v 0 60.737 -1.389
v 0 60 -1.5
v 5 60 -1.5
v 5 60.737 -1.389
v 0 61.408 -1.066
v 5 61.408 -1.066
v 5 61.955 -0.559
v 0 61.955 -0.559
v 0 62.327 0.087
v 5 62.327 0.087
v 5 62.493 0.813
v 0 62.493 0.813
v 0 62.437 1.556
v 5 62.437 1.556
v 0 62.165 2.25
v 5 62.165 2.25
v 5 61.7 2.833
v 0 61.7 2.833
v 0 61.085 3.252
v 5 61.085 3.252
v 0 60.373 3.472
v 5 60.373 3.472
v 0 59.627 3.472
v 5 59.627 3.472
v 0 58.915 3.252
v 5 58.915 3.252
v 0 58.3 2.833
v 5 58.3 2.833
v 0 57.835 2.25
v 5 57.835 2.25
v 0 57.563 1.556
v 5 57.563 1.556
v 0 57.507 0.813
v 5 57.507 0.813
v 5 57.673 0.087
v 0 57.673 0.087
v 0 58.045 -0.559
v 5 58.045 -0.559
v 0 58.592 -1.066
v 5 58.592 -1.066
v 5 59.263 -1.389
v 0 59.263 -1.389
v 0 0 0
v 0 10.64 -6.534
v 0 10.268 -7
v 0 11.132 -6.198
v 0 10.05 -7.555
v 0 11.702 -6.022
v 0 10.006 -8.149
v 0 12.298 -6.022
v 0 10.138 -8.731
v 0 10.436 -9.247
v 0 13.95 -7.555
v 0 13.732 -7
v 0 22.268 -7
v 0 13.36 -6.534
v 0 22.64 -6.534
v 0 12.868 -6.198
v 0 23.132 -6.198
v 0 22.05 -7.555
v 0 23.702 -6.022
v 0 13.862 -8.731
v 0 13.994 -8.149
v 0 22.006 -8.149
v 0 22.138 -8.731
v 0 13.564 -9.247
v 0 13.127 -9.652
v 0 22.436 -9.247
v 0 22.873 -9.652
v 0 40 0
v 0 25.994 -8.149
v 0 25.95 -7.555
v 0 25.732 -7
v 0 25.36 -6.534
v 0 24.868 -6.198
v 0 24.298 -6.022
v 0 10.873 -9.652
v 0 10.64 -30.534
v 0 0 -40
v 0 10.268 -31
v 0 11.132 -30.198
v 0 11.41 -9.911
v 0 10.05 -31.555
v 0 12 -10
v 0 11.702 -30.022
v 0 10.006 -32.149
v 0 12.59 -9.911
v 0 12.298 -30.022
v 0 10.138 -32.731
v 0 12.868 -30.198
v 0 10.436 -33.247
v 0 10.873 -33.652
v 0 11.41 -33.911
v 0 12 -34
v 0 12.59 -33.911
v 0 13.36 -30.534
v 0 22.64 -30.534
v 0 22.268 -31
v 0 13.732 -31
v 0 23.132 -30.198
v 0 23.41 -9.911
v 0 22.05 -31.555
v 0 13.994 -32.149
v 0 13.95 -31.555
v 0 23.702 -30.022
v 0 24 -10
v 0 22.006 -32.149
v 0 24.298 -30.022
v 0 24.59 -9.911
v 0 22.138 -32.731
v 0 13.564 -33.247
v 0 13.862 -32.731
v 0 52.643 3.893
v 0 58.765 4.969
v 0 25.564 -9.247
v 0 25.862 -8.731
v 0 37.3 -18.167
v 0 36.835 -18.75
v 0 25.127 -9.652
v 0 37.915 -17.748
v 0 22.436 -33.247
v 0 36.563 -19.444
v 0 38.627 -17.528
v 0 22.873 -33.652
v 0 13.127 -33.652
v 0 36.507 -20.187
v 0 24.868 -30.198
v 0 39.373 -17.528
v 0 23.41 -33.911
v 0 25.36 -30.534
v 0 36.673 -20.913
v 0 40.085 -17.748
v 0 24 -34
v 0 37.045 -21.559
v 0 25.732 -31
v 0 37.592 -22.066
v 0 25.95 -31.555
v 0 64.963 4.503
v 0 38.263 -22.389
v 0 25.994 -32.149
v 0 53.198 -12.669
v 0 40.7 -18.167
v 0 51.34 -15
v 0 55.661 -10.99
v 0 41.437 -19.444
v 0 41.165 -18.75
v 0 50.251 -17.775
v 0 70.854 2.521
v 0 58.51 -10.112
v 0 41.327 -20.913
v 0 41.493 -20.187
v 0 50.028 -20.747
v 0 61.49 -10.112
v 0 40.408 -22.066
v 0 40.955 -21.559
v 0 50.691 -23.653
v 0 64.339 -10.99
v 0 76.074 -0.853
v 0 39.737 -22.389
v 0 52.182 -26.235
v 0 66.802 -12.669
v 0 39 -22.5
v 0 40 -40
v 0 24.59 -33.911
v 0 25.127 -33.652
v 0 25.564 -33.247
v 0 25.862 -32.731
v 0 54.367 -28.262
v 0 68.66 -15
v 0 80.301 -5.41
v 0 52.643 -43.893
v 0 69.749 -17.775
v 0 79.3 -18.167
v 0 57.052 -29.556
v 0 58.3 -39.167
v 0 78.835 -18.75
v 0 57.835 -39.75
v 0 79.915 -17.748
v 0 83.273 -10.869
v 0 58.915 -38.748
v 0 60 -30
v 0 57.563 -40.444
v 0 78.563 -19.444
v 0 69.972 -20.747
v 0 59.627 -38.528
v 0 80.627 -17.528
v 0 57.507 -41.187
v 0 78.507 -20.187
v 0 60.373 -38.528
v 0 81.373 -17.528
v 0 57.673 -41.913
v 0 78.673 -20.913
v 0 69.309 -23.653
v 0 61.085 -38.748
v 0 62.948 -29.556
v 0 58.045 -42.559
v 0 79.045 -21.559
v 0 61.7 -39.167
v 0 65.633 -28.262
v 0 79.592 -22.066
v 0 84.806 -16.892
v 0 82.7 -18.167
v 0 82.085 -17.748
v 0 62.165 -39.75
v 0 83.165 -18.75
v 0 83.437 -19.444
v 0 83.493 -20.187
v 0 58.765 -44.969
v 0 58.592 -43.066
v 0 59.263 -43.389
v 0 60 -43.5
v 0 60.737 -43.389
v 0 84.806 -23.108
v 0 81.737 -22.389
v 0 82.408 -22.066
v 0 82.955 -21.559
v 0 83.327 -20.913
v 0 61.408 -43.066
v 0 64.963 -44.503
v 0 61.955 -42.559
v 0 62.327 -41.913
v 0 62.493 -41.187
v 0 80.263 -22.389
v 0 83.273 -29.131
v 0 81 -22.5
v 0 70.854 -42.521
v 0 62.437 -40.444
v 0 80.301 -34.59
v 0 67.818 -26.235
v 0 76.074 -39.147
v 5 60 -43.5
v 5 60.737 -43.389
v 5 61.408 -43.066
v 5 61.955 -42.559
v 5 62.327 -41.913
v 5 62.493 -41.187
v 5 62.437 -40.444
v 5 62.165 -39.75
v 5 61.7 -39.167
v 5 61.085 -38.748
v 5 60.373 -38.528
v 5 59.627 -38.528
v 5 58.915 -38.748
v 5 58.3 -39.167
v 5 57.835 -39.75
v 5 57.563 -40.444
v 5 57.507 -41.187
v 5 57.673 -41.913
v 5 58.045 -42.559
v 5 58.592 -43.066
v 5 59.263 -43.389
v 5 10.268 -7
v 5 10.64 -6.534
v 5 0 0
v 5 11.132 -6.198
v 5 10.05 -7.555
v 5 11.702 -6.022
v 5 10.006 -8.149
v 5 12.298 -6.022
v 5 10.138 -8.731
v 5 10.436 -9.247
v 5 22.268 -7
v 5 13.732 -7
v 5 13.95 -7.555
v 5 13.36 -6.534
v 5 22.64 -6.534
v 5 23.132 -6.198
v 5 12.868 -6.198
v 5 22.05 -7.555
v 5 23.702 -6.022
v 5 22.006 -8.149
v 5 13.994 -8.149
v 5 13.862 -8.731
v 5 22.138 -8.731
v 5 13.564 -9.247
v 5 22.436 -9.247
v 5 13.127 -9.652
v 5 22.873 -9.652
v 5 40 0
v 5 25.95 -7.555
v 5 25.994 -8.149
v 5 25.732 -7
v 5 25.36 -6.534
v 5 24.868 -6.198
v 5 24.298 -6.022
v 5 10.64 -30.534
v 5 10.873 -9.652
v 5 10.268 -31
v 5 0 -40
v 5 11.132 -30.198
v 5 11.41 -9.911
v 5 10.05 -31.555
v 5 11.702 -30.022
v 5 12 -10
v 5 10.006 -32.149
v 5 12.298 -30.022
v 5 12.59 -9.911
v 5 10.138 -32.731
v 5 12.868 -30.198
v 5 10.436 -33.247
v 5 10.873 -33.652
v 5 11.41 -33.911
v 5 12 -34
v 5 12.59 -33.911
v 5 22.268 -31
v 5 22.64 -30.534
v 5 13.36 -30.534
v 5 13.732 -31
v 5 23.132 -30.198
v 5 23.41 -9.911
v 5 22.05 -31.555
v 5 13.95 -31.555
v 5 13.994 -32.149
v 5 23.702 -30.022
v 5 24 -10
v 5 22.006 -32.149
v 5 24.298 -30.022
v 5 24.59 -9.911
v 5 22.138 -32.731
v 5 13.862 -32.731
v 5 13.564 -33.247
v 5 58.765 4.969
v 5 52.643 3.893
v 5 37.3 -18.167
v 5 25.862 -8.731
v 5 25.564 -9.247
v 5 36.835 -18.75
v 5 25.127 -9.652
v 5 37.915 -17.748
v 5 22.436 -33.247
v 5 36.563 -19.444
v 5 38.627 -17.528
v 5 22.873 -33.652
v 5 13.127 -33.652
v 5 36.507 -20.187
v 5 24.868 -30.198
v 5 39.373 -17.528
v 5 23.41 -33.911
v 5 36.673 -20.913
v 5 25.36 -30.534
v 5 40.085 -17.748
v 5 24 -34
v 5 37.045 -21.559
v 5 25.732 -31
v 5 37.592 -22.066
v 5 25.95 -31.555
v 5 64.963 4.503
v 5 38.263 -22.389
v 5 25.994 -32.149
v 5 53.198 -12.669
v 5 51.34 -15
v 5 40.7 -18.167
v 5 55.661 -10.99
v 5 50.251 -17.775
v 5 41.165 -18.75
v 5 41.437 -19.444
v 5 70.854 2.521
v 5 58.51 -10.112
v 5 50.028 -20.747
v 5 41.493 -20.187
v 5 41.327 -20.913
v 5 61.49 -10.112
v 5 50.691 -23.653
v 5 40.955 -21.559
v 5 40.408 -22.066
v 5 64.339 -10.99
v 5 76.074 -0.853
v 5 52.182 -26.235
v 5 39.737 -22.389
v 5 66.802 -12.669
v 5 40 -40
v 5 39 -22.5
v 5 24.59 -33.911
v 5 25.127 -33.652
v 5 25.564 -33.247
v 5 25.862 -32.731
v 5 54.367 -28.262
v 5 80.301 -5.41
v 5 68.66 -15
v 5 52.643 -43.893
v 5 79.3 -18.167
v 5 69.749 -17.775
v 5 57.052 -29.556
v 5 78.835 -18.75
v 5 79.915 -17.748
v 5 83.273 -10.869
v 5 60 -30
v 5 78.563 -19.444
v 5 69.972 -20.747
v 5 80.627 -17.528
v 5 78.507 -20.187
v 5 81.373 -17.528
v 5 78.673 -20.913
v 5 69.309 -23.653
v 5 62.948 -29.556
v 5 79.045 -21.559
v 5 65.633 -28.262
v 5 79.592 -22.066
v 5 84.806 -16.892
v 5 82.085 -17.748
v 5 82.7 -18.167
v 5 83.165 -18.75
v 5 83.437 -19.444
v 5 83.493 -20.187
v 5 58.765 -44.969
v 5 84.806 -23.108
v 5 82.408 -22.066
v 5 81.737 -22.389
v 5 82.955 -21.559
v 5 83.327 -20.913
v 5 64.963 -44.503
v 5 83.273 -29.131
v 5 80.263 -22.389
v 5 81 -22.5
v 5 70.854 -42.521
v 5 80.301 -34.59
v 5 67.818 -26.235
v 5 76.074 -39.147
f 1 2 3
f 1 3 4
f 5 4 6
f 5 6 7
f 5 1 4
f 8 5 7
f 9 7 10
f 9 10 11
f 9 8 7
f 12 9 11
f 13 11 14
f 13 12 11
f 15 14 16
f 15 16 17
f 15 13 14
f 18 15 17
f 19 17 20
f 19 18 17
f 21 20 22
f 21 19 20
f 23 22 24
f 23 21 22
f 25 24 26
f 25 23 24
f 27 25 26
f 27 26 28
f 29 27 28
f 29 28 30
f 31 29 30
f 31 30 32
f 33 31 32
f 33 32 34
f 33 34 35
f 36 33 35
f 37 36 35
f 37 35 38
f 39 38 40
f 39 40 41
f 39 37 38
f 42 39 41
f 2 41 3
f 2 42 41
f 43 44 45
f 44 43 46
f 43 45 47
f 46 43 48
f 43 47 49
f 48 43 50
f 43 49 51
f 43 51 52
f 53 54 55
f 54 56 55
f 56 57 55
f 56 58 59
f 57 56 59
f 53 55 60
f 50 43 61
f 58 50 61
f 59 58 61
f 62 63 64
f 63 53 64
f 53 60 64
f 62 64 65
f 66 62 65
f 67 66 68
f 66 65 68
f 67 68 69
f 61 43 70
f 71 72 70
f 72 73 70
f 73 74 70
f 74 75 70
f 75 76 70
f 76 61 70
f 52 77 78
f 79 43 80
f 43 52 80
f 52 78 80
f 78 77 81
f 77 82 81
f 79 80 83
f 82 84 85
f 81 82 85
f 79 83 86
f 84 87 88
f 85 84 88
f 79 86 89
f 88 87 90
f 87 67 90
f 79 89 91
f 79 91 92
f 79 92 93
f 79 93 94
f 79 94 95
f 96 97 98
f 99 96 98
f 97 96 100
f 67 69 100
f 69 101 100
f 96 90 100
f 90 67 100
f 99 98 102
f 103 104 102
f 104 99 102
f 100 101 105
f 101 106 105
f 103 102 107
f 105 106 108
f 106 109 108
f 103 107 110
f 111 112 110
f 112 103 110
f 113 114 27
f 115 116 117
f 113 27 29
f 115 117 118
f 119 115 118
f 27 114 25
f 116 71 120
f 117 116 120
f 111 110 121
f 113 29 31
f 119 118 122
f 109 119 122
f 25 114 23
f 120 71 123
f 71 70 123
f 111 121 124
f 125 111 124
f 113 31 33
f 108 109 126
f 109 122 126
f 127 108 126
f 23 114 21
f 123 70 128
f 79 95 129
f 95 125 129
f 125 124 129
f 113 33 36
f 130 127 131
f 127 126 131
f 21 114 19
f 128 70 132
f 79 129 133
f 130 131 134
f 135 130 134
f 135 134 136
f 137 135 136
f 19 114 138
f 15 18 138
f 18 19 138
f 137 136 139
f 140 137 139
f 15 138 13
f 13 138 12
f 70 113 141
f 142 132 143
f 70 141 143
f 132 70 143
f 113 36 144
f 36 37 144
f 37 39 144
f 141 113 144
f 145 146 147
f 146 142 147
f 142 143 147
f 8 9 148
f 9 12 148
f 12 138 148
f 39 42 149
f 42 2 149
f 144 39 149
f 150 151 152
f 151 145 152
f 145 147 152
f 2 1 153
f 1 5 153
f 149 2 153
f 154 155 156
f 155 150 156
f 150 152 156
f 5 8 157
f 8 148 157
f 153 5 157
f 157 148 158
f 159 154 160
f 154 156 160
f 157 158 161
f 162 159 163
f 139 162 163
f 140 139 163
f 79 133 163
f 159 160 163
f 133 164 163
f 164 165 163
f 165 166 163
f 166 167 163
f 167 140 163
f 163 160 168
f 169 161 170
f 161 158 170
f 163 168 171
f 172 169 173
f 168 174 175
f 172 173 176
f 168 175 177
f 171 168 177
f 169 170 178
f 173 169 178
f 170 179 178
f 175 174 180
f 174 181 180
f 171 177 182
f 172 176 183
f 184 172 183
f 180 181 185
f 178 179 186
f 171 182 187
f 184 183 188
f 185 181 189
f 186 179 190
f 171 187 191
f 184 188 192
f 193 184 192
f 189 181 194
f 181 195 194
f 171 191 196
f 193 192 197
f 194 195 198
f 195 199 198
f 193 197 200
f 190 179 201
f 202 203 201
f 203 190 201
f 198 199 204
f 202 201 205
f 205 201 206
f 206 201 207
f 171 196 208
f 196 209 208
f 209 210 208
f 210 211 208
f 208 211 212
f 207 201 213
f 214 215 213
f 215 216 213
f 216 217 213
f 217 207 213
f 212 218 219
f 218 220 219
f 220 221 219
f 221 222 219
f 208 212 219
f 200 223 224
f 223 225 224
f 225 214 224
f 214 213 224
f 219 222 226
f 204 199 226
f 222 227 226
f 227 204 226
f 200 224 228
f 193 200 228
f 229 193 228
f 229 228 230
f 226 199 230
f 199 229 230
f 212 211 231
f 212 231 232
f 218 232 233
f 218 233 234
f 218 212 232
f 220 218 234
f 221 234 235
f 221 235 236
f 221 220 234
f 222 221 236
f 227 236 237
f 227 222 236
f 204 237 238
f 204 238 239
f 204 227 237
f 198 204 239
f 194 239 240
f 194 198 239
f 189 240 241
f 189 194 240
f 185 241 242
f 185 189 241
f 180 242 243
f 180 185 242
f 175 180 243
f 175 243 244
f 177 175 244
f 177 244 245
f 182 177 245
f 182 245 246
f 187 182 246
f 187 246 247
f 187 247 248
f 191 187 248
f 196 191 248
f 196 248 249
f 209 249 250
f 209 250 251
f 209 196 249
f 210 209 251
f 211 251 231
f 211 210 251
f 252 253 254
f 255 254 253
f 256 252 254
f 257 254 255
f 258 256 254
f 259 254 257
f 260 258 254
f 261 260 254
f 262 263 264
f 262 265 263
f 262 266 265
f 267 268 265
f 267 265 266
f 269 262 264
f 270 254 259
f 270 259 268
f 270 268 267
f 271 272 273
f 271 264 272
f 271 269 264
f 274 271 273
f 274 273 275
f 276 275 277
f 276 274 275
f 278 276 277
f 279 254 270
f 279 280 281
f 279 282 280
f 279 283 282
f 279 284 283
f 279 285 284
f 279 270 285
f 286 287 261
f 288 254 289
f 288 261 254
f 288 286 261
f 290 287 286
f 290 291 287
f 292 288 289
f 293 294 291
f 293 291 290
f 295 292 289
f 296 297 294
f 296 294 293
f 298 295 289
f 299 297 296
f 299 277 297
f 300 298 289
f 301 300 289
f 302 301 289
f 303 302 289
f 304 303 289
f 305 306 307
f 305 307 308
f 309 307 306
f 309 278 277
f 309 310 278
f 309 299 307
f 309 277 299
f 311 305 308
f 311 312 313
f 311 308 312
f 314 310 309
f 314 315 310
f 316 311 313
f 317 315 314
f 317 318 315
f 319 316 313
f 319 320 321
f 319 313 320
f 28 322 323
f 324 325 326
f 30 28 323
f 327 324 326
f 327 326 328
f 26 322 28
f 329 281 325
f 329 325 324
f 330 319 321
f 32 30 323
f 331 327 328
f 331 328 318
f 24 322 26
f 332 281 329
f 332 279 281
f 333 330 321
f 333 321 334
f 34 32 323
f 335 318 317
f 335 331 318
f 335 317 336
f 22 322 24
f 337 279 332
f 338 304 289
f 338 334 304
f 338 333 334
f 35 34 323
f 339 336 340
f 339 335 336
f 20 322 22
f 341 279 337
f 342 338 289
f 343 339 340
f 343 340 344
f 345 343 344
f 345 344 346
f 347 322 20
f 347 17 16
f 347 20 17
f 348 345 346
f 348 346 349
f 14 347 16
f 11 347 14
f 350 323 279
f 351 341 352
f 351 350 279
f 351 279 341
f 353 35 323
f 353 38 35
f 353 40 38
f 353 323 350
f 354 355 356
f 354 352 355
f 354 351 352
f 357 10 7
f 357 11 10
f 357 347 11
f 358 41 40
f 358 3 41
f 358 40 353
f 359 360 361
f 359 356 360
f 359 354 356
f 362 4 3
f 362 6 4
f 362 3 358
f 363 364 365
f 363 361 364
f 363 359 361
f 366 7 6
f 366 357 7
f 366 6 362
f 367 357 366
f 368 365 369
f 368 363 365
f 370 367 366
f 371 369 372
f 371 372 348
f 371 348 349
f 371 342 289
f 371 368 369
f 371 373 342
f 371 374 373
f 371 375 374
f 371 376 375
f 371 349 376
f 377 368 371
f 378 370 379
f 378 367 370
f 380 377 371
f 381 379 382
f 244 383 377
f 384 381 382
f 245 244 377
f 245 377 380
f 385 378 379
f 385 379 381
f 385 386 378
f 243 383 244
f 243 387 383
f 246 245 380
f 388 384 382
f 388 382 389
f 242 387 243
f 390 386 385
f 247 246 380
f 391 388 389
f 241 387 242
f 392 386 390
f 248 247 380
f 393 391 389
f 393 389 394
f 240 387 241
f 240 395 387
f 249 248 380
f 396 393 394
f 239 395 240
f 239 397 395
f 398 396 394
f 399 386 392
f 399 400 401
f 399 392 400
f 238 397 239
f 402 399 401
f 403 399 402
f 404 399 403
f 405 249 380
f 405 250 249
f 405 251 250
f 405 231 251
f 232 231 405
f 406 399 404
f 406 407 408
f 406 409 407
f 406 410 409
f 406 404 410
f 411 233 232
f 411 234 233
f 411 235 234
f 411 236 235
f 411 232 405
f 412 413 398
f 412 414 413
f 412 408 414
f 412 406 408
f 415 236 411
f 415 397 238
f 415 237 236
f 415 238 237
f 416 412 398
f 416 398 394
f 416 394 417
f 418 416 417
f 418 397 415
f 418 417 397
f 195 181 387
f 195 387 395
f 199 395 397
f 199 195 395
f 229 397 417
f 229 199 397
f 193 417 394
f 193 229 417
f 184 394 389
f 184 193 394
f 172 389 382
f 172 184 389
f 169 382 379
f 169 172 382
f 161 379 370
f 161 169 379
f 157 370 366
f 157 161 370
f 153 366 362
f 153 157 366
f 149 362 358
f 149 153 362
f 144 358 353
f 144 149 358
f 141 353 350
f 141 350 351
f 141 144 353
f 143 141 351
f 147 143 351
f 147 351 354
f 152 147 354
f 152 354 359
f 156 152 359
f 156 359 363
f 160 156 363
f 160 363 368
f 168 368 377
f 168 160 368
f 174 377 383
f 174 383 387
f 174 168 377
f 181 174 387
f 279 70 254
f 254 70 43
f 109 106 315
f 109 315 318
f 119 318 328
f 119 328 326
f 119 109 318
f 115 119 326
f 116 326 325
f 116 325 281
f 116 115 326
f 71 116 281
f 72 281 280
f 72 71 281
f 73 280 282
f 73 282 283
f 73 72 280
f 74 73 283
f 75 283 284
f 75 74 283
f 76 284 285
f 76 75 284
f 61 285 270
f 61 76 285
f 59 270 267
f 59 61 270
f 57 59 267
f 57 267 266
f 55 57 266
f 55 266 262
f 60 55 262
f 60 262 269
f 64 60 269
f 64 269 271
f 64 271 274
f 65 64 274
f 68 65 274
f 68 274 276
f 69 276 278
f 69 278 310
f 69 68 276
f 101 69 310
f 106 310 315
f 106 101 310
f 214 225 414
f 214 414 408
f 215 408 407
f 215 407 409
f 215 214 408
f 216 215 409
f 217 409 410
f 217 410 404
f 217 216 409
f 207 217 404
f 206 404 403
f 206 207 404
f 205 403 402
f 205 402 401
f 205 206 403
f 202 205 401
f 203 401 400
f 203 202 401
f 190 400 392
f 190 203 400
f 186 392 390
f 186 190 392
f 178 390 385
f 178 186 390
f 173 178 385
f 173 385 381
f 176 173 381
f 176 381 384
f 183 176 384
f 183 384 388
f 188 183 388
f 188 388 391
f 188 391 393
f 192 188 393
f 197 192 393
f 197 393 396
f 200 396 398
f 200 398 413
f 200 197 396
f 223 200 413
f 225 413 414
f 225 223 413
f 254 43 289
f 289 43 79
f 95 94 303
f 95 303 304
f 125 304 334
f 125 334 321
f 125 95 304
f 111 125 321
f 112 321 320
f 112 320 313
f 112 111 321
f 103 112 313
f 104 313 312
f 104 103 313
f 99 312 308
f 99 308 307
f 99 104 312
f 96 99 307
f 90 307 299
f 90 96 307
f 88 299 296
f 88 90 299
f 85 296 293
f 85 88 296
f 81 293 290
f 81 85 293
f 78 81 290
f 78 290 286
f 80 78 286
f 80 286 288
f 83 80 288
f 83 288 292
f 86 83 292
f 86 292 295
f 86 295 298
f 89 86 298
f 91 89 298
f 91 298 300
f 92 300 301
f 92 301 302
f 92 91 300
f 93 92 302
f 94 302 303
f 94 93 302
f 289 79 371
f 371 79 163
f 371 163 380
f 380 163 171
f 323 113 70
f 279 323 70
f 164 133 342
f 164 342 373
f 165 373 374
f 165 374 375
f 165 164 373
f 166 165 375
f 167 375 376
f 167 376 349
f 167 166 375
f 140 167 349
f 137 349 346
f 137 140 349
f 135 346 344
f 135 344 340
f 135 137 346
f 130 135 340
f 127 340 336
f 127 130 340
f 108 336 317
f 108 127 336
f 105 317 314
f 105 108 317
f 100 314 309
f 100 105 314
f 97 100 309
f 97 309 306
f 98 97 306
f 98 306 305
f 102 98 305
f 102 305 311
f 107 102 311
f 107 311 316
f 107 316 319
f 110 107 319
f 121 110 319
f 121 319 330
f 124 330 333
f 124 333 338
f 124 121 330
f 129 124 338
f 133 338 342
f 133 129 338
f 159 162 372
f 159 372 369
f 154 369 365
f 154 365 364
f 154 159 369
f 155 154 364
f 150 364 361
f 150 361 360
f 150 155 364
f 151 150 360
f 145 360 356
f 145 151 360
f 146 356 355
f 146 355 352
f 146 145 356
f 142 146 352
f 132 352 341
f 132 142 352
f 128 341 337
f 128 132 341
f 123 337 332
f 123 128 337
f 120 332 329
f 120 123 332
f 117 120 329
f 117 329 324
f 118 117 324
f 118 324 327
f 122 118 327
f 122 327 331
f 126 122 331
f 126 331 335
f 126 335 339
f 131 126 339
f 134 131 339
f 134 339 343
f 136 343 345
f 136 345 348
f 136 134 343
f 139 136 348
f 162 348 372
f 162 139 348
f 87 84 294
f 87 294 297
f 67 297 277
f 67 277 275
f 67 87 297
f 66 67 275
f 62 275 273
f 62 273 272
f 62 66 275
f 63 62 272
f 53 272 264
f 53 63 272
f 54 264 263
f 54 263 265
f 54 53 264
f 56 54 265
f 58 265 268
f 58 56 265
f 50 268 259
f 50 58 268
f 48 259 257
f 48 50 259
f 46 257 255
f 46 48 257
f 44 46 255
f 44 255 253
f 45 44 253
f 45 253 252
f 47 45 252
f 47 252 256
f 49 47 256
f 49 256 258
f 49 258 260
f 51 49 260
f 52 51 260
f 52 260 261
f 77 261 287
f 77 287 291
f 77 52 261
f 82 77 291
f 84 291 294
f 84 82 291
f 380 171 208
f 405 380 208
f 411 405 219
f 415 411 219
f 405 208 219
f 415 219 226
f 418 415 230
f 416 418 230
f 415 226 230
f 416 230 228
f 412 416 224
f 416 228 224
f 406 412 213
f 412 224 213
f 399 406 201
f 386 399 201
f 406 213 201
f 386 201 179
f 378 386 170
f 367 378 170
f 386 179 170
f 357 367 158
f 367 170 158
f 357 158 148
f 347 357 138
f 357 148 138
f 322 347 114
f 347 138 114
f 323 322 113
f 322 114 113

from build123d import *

# Parameters (mm, degrees)
CROQUIS1_R              = 2
CROQUIS1_R_2            = 2.5
CROQUIS1_R_3            = 10
SALIENTE_EXTRUIR1_DEPTH = 5


with BuildPart() as part:
    # Croquis1 → Saliente-Extruir1 (new body)
    with BuildSketch(Plane(origin=(0, 0, 0), x_dir=(0, 0, -1), z_dir=(1, 0, 0))):
        with BuildLine():
            ThreePointArc((43.892972847, 52.642972847), (20, 85), (-3.892972847, 52.642972847))
            Line((-3.892972847, 52.642972847), (0, 40))
            Line((0, 40), (0, 0))
            Line((0, 0), (40, 0))
            Line((40, 0), (40, 40))
            Line((40, 40), (43.892972847, 52.642972847))
        make_face()
        with Locations((8, 12)):
            Circle(CROQUIS1_R, mode=Mode.SUBTRACT)
        with Locations((8, 24)):
            Circle(CROQUIS1_R, mode=Mode.SUBTRACT)
        with Locations((20, 39)):
            Circle(CROQUIS1_R_2, mode=Mode.SUBTRACT)
        with Locations((32, 12)):
            Circle(CROQUIS1_R, mode=Mode.SUBTRACT)
        with Locations((32, 24)):
            Circle(CROQUIS1_R, mode=Mode.SUBTRACT)
        with Locations((-1, 60)):
            Circle(CROQUIS1_R_2, mode=Mode.SUBTRACT)
        with Locations((20, 60)):
            Circle(CROQUIS1_R_3, mode=Mode.SUBTRACT)
        with Locations((20, 81)):
            Circle(CROQUIS1_R_2, mode=Mode.SUBTRACT)
        with Locations((41, 60)):
            Circle(CROQUIS1_R_2, mode=Mode.SUBTRACT)
    extrude(amount=SALIENTE_EXTRUIR1_DEPTH)


solid = part.part
